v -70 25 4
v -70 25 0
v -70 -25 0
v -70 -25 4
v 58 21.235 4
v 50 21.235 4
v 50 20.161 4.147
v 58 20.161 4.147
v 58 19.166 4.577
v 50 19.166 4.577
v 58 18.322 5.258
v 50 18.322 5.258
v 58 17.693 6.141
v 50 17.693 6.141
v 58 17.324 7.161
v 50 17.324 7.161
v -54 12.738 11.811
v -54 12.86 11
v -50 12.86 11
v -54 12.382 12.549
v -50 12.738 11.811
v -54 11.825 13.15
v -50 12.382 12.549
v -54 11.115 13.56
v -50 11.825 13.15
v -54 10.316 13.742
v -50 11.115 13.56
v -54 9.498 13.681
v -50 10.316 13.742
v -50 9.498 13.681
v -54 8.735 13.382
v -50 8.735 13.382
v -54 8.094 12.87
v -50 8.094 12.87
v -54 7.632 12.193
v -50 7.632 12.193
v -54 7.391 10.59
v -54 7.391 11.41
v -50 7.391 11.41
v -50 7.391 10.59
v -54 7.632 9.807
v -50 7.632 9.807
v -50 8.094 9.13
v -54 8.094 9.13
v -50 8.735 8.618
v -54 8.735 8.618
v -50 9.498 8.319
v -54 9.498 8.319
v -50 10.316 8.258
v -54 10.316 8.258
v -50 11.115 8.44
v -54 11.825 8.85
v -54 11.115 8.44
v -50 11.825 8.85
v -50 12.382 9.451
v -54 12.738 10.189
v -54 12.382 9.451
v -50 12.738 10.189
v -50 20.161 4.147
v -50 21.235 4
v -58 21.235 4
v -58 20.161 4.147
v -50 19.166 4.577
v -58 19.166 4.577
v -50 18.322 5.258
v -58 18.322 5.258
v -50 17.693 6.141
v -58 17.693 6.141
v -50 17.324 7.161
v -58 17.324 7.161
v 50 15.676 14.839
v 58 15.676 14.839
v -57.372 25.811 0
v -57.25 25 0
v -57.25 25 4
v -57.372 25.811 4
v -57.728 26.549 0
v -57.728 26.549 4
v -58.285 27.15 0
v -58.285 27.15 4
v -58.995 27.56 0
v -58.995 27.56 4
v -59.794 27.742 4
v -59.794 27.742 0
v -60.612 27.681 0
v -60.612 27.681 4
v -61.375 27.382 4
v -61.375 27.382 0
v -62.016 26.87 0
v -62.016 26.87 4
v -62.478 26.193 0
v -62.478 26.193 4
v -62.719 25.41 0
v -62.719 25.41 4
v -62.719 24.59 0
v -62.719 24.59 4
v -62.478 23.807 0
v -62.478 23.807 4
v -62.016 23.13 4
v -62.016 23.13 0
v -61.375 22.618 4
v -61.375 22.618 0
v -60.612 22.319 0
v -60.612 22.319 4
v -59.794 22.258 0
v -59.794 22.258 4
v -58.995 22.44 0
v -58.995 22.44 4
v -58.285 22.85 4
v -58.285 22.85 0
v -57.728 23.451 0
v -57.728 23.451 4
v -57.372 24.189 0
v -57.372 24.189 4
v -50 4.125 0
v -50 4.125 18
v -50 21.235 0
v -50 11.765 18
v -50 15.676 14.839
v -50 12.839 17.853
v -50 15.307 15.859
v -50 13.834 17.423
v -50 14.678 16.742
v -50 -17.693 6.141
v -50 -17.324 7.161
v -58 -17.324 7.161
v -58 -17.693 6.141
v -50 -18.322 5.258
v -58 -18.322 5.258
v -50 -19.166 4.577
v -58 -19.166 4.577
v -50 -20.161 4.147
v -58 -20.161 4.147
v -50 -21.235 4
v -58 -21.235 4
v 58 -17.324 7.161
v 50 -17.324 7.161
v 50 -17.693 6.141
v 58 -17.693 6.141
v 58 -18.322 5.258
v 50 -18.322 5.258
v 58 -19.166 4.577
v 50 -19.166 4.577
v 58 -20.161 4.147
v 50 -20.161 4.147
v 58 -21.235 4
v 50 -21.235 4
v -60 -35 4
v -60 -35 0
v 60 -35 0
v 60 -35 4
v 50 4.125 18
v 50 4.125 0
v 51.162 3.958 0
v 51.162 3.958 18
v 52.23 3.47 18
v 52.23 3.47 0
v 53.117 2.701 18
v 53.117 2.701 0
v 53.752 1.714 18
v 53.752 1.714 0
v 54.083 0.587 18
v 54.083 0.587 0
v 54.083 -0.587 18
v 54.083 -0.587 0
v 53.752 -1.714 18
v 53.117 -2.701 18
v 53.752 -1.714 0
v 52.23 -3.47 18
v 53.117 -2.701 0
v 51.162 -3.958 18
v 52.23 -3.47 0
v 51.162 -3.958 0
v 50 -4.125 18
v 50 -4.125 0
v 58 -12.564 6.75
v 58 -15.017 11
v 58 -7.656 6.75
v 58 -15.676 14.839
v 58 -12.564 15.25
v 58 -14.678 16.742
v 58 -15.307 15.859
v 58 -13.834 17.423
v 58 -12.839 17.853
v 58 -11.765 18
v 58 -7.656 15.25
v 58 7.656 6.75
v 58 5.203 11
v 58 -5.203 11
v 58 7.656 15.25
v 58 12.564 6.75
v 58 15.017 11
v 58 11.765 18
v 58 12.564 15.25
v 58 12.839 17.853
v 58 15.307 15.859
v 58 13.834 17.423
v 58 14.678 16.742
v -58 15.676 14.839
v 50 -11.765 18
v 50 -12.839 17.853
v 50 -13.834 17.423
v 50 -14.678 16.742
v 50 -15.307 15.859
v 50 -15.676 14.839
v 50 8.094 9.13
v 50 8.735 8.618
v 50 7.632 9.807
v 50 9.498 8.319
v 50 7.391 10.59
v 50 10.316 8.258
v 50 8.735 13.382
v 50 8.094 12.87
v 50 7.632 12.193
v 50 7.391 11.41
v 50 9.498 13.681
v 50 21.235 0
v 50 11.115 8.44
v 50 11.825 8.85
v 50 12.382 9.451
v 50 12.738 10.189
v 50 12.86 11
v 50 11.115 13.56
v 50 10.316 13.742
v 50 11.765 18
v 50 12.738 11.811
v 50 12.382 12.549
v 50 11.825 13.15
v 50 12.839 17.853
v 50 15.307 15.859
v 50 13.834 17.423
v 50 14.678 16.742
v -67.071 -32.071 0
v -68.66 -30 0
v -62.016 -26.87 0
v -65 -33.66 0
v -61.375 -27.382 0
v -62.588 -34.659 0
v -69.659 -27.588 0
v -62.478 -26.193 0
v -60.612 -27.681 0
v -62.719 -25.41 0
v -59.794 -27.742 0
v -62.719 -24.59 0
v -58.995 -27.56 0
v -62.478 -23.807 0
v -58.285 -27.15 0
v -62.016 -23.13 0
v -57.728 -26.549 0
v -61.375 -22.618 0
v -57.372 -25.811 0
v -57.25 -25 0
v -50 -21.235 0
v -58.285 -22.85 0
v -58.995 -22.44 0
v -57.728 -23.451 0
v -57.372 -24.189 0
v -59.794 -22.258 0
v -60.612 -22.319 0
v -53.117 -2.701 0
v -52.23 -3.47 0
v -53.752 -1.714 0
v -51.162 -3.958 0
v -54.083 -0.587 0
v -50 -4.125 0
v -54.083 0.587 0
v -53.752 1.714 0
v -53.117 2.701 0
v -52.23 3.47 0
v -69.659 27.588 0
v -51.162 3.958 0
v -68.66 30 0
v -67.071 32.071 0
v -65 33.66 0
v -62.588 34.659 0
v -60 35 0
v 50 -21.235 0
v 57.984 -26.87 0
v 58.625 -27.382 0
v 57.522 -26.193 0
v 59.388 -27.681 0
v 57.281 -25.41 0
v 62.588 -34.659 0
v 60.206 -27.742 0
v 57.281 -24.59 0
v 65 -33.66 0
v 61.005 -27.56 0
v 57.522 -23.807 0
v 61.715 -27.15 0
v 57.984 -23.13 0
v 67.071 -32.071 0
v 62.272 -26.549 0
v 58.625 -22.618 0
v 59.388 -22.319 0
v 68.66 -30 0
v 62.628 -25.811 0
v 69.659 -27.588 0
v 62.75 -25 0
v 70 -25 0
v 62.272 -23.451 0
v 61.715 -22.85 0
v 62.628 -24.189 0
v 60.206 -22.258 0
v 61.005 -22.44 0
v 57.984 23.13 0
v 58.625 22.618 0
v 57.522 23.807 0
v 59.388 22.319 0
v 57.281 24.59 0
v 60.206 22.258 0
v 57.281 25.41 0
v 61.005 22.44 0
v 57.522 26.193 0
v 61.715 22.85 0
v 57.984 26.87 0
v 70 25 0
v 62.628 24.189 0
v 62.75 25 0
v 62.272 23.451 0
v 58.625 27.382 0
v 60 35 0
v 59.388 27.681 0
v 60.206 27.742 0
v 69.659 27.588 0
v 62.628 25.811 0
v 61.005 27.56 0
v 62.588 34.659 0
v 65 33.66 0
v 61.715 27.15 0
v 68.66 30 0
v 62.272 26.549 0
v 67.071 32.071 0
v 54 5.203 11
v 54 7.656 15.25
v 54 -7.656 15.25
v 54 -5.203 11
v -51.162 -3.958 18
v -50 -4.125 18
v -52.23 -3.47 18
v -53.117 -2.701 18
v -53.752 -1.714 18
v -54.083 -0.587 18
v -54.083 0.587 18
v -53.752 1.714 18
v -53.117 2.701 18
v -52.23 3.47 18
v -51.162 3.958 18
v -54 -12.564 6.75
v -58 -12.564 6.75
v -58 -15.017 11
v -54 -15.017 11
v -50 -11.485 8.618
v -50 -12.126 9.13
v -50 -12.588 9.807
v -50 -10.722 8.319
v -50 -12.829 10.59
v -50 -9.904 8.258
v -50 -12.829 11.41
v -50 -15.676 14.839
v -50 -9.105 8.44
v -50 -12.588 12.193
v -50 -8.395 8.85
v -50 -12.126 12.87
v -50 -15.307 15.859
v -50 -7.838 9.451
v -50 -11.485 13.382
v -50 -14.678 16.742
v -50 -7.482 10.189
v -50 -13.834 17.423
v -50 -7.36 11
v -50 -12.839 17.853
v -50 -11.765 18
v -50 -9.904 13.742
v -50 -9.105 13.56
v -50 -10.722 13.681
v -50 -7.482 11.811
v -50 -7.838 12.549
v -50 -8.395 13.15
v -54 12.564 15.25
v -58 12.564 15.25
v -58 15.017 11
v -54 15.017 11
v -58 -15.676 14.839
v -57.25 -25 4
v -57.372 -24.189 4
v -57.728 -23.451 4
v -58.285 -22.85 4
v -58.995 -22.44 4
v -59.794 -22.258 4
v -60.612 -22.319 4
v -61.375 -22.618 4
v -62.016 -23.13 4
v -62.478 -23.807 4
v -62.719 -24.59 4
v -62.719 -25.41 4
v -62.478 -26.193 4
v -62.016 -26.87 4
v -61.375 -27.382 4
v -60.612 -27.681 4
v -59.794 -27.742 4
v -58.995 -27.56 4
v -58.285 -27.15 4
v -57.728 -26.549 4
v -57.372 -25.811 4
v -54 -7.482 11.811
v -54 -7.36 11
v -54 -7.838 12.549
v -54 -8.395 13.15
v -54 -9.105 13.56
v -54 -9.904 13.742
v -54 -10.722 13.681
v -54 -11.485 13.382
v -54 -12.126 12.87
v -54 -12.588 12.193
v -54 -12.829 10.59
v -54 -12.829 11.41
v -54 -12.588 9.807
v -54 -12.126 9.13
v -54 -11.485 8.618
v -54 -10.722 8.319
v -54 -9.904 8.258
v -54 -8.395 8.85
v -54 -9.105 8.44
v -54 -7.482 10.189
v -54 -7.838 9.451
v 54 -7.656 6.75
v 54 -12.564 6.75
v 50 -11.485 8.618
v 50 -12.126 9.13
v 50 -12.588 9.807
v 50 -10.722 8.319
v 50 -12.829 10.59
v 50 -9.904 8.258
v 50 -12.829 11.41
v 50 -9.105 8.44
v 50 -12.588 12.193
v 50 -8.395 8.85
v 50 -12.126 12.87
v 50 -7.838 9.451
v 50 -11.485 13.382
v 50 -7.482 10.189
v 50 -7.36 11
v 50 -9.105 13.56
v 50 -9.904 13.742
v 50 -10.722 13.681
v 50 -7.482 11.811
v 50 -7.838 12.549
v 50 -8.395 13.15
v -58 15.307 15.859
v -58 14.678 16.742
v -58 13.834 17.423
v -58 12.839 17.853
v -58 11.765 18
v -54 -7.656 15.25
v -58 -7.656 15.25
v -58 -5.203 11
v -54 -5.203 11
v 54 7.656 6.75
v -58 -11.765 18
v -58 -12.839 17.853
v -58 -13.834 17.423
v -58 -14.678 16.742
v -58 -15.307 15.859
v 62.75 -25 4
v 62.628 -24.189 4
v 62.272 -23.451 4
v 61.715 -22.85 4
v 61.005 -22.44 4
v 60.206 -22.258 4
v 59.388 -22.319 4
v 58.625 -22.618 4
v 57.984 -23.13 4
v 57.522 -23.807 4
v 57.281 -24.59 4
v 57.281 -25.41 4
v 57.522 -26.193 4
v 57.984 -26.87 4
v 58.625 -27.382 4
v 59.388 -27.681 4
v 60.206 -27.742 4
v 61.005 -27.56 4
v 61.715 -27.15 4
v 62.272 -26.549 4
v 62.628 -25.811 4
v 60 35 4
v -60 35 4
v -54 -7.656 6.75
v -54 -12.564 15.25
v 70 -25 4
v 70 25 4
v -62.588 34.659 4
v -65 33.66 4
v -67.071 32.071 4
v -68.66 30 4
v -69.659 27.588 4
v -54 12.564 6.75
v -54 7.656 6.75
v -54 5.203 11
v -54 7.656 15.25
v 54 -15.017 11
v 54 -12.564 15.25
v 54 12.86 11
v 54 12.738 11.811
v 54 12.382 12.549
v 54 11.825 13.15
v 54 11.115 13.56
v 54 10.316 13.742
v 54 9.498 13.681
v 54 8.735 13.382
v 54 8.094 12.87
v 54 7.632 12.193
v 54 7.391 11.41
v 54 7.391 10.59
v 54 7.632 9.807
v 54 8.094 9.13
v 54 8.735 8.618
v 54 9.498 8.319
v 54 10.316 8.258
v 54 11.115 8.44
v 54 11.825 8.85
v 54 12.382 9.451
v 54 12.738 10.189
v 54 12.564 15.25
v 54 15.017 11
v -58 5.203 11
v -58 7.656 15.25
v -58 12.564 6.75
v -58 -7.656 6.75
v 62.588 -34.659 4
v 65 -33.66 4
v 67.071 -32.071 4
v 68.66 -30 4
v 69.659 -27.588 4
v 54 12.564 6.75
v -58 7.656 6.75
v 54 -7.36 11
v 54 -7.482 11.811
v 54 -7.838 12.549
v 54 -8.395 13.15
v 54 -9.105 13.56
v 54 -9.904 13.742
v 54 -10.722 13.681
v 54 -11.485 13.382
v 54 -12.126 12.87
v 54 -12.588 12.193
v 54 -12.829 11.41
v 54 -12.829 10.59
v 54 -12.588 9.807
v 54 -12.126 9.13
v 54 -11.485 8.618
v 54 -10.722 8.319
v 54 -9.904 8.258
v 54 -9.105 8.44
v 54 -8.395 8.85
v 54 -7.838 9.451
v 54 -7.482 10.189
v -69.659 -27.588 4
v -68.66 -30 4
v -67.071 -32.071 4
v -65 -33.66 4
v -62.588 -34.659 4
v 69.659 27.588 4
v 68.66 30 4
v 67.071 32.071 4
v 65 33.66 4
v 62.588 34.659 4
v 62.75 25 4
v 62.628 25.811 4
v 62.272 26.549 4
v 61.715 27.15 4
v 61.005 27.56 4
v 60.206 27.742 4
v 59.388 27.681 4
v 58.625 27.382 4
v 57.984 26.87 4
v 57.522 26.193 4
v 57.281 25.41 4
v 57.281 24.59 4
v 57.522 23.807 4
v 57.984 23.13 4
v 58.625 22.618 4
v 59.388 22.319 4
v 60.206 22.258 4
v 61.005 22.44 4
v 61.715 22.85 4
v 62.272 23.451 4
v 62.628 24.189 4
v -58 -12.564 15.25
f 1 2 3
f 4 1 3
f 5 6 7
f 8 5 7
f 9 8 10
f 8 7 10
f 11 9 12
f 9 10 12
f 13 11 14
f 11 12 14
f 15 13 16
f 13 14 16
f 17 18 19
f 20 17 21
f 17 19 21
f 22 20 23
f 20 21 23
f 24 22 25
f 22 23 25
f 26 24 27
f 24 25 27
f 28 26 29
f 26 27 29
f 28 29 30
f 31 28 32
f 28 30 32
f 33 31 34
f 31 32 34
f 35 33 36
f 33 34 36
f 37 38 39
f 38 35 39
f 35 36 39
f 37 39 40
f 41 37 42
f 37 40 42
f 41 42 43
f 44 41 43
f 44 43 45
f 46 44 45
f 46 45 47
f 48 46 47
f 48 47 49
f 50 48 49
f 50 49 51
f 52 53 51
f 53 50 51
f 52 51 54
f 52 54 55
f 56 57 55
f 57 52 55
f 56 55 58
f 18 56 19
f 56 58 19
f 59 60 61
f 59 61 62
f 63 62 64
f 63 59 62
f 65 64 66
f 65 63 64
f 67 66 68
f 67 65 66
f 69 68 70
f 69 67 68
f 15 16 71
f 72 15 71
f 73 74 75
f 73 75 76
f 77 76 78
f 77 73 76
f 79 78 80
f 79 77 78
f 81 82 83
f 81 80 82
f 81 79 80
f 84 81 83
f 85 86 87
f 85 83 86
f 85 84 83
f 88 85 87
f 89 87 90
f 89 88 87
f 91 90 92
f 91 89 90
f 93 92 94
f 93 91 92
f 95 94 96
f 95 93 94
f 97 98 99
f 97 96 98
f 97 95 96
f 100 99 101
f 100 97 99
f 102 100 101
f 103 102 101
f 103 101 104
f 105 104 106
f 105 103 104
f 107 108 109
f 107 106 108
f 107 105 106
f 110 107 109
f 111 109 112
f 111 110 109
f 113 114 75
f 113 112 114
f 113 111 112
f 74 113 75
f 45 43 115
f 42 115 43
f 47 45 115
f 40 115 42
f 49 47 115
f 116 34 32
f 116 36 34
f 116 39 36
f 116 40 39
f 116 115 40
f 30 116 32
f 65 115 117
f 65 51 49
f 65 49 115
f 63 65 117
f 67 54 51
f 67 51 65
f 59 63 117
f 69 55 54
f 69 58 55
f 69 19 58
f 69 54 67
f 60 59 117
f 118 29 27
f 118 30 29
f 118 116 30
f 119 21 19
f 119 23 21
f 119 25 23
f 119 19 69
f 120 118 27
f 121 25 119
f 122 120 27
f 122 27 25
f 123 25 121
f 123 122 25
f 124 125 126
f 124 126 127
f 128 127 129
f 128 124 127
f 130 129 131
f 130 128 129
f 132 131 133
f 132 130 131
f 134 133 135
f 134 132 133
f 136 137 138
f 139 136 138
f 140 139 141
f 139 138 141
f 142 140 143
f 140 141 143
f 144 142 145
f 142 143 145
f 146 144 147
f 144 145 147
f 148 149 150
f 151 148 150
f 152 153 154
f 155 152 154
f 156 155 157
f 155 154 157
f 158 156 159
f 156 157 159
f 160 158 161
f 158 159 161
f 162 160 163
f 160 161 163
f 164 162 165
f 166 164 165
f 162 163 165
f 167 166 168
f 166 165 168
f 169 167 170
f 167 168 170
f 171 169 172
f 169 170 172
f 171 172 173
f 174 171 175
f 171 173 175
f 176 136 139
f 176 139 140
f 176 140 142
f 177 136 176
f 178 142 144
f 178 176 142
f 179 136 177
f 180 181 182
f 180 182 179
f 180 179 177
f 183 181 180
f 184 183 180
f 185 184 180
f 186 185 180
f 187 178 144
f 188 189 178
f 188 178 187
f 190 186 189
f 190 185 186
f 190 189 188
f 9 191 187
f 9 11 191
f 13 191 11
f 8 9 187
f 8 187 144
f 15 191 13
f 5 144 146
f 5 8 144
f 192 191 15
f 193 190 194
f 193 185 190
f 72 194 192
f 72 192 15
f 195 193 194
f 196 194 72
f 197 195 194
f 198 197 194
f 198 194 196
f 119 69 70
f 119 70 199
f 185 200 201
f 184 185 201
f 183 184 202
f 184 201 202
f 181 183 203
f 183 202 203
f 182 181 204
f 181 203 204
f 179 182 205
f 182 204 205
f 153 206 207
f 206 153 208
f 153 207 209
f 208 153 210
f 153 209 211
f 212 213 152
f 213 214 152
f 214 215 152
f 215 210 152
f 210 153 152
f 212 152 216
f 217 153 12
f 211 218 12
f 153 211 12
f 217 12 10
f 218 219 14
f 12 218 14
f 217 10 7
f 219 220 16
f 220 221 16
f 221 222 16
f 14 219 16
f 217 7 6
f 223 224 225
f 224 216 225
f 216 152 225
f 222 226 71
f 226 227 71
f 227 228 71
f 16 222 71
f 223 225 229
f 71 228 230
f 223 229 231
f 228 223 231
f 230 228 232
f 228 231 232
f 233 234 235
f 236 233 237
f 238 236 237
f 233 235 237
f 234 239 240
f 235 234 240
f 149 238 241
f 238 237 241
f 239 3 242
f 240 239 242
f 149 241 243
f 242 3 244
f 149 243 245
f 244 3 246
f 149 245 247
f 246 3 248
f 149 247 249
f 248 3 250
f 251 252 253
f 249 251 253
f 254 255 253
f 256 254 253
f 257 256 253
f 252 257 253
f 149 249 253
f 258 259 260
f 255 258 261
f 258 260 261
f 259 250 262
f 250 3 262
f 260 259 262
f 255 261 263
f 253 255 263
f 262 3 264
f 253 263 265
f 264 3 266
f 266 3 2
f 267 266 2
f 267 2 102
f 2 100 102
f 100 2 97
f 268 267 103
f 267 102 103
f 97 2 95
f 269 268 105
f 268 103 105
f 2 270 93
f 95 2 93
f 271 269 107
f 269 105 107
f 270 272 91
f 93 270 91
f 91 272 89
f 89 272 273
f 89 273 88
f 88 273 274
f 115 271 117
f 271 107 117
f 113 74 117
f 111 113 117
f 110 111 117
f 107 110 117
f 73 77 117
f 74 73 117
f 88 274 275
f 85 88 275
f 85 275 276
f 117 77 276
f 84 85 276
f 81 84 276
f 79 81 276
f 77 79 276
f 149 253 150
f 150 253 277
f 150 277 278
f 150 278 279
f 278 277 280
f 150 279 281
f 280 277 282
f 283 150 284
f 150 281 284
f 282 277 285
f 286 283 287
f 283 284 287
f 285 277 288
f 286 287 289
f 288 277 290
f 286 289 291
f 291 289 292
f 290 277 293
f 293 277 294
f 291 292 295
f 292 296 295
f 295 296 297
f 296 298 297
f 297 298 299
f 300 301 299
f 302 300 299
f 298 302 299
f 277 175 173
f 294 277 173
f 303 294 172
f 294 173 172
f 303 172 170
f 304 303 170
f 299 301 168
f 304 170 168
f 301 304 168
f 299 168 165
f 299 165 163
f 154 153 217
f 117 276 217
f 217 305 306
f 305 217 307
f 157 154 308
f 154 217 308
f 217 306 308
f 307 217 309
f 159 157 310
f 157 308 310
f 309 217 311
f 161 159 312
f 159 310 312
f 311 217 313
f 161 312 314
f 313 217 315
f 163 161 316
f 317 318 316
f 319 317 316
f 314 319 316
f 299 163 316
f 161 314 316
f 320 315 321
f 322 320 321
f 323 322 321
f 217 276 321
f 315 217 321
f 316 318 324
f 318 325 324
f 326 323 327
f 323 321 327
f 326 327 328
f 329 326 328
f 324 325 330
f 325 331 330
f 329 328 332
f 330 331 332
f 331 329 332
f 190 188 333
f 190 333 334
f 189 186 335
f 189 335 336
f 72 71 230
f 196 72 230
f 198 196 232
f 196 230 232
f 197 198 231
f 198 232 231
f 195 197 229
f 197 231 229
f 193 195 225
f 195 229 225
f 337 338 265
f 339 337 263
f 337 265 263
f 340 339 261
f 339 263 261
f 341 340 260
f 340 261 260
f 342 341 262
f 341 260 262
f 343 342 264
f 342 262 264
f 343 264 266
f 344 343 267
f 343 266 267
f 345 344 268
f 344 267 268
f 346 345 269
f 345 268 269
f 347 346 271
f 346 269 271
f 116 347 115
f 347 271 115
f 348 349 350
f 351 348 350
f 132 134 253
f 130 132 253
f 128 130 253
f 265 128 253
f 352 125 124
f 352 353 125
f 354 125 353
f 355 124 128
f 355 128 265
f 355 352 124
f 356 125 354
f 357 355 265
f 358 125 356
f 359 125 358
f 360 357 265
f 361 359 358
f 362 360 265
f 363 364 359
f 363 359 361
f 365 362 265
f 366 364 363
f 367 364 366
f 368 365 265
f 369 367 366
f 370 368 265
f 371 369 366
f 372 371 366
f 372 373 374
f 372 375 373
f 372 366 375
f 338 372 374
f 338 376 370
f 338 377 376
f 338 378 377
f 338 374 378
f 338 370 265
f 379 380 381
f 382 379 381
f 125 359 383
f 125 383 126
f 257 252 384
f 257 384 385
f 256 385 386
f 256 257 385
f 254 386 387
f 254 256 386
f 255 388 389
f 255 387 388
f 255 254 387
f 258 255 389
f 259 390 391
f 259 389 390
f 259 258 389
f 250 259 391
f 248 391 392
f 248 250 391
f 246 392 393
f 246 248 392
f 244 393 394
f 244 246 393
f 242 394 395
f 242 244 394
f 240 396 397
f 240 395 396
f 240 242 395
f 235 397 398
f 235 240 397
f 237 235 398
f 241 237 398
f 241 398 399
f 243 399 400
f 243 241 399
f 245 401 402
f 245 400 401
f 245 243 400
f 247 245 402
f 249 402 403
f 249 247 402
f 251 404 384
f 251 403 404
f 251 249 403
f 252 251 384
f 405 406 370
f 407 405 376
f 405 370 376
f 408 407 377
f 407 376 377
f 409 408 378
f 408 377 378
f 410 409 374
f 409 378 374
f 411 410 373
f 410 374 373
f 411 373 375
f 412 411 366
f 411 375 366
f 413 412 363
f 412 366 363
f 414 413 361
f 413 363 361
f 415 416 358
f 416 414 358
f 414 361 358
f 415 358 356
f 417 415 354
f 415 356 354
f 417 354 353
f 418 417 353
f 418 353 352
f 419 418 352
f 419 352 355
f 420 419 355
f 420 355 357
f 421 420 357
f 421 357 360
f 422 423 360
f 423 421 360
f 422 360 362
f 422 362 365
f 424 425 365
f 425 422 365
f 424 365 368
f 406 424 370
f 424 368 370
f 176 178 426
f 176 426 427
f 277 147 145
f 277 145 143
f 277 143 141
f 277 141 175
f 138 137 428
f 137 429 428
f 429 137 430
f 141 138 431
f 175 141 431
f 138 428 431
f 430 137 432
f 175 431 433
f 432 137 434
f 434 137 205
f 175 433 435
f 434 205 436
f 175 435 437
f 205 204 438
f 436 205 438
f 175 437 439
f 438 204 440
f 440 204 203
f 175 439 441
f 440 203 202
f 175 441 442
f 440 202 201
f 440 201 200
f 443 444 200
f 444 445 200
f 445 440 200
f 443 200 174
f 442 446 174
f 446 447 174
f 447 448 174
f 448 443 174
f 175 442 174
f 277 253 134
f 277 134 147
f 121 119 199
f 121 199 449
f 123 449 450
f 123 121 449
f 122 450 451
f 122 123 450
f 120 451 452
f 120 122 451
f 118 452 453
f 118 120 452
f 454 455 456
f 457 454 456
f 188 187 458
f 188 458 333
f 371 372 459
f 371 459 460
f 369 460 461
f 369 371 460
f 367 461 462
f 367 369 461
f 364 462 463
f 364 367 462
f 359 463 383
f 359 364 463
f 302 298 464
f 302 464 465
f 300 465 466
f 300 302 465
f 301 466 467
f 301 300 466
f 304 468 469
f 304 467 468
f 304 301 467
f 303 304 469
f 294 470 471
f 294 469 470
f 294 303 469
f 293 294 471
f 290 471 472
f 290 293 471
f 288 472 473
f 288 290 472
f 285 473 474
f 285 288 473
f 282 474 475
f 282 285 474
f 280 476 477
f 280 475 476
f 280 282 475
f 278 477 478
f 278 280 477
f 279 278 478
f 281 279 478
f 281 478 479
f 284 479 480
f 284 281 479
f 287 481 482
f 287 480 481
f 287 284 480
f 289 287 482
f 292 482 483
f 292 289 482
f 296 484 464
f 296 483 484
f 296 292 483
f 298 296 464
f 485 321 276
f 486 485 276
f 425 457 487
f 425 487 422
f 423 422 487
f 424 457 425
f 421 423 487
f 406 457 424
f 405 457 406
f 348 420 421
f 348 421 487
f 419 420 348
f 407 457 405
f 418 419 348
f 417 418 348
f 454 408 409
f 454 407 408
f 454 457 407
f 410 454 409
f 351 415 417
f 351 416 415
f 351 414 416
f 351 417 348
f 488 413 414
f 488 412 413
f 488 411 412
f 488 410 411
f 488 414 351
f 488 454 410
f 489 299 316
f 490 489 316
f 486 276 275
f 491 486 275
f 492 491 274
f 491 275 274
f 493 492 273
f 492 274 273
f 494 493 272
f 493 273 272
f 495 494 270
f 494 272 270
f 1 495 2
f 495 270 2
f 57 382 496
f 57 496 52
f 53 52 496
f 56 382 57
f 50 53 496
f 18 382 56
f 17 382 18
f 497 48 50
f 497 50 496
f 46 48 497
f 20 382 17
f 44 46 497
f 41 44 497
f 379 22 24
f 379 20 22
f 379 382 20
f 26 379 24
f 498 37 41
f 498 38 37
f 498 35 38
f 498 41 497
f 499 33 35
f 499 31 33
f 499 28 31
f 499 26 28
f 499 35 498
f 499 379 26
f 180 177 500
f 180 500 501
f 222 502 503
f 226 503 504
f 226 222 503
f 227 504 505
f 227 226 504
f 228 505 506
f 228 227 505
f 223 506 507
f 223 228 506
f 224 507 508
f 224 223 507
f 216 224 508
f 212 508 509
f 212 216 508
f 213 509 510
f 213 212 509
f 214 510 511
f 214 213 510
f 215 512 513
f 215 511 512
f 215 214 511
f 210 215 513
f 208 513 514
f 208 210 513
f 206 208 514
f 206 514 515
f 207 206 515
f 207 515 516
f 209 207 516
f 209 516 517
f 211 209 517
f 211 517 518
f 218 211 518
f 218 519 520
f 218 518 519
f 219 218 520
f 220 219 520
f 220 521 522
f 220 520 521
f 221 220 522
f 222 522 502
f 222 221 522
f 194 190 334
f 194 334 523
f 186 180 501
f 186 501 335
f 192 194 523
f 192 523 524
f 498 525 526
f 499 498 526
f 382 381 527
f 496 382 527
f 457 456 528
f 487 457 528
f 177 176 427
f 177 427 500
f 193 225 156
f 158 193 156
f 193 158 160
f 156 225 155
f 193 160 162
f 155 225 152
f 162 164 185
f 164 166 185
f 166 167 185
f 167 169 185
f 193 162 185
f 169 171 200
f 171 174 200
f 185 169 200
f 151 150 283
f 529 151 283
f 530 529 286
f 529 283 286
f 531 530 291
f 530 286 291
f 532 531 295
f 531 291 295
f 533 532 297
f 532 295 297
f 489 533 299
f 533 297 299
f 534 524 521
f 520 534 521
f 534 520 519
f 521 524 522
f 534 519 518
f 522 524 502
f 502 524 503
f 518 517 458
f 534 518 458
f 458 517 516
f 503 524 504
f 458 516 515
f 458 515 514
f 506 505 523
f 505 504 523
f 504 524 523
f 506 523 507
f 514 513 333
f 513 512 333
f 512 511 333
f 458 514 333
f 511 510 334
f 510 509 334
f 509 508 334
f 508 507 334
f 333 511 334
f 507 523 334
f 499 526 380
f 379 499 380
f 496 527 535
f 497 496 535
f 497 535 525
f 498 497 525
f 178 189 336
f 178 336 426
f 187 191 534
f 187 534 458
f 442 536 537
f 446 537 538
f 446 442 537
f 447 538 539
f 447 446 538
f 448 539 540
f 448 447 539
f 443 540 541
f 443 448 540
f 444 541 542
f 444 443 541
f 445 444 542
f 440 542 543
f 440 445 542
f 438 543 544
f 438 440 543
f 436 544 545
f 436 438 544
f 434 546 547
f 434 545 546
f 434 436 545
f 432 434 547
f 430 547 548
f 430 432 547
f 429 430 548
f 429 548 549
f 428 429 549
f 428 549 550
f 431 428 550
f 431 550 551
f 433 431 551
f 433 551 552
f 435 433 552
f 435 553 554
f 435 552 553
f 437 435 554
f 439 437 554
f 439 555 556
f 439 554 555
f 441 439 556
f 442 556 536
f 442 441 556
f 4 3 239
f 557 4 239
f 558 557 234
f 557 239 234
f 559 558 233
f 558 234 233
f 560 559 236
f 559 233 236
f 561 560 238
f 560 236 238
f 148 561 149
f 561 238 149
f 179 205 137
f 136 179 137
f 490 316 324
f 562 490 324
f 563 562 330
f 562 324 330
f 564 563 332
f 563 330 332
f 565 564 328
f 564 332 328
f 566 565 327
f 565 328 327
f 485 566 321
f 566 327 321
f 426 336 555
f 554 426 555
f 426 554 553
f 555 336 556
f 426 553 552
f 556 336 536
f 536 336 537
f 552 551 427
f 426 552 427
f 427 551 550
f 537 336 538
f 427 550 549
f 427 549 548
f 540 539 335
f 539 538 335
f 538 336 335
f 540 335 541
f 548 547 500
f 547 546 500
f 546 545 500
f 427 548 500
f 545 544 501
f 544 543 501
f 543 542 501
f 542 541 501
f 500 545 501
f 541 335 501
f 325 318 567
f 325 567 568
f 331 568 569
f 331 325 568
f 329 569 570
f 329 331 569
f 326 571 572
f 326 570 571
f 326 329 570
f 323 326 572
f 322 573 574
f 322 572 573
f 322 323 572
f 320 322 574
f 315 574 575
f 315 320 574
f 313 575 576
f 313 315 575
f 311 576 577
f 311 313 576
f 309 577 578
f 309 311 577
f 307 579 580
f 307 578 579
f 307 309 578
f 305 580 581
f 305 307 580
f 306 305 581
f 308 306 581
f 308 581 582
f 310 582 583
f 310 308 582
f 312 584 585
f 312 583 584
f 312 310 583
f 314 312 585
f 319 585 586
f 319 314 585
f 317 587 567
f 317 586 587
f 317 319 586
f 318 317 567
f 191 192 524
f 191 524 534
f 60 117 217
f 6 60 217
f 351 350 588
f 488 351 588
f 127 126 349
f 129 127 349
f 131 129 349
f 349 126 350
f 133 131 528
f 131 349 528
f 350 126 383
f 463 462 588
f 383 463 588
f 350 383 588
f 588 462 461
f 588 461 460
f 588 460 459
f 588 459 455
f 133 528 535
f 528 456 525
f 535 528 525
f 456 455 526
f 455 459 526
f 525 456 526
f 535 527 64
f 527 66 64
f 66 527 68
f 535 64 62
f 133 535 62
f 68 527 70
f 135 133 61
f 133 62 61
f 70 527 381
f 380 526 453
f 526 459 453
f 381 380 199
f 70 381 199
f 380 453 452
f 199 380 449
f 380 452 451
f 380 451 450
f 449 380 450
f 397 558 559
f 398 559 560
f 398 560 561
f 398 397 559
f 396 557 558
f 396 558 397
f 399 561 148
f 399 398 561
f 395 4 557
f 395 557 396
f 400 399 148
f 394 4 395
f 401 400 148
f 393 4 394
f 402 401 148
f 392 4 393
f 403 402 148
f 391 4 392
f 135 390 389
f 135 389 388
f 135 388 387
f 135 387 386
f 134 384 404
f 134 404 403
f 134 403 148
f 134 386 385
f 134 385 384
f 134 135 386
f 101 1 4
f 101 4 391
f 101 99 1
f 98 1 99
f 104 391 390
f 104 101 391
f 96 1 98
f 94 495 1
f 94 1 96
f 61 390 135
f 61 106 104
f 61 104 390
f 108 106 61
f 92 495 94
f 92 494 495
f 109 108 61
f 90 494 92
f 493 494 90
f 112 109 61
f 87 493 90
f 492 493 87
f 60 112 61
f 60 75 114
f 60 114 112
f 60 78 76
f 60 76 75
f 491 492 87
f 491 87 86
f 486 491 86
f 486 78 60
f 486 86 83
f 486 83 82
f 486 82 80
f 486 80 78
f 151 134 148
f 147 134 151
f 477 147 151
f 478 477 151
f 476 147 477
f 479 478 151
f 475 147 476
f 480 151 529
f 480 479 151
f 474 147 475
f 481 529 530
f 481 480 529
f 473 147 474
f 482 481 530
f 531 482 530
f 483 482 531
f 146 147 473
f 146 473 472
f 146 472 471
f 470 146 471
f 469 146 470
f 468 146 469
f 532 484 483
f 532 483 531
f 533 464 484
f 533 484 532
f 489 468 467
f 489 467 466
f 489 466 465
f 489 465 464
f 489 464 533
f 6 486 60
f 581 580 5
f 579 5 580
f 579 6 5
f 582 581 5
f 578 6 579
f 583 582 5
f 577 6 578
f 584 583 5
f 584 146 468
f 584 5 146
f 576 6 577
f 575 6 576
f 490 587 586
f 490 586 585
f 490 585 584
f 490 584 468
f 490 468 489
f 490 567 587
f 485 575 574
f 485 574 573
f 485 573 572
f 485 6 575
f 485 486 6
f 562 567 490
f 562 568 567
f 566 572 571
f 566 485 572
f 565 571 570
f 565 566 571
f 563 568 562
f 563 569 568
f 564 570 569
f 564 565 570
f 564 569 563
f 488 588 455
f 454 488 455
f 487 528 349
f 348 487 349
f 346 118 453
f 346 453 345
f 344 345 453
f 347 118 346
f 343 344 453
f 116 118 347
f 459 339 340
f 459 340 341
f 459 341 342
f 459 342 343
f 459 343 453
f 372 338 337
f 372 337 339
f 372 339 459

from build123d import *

# Parameters (mm, degrees)
F0_R     = 2.75
F0_W     = 100
F0_H     = 42.47
F1_DEPTH = 4
F2_R     = 2.75
F3_DEPTH = 8
F4_R     = 2.75
F5_DEPTH = 4
F7_R     = 4.125
F8_DEPTH = 18.001


with BuildPart() as f1:
    # F0 (on Top) → F1 (new body)
    with BuildSketch(Plane.XY):
        with BuildLine():
            ThreePointArc((70, 25), (67.0710678119, 32.0710678119), (60, 35))
            Line((60, 35), (-60, 35))
            ThreePointArc((-60, 35), (-67.0710678119, 32.0710678119), (-70, 25))
            Line((-70, 25), (-70, -25))
            ThreePointArc((-70, -25), (-67.0710678119, -32.0710678119), (-60, -35))
            Line((-60, -35), (60, -35))
            ThreePointArc((60, -35), (67.0710678119, -32.0710678119), (70, -25))
            Line((70, -25), (70, 25))
        make_face()
        with Locations((-60, -25)):
            Circle(F0_R, mode=Mode.SUBTRACT)
        with Locations((60, -25)):
            Circle(F0_R, mode=Mode.SUBTRACT)
        with Locations((-60, 25)):
            Circle(F0_R, mode=Mode.SUBTRACT)
        Rectangle(F0_W, F0_H, mode=Mode.SUBTRACT)
        with Locations((60, 25)):
            Circle(F0_R, mode=Mode.SUBTRACT)
    extrude(amount=F1_DEPTH)

    # F2 (on face) → F3 (join)
    with BuildSketch(Plane.YZ.offset(-50)):
        with BuildLine():
            ThreePointArc((-17.3240695981, 7.1605815157), (-18.7208076781, 4.8889170746), (-21.235, 4))
            Line((-21.235, 4), (21.235, 4))
            ThreePointArc((21.235, 4), (18.7208076781, 4.8889170746), (17.3240695981, 7.1605815157))
            Line((17.3240695981, 7.1605815157), (15.6759304019, 14.8394184843))
            ThreePointArc((15.6759304019, 14.8394184843), (14.2791923219, 17.1110829254), (11.765, 18))
            Line((11.765, 18), (-11.765, 18))
            ThreePointArc((-11.765, 18), (-14.2791923219, 17.1110829254), (-15.6759304019, 14.8394184843))
            Line((-15.6759304019, 14.8394184843), (-17.3240695981, 7.1605815157))
        make_face()
        with Locations((-10.11, 11)):
            Circle(F2_R, mode=Mode.SUBTRACT)
        with Locations((10.11, 11)):
            Circle(F2_R, mode=Mode.SUBTRACT)
    extrude(amount=-F3_DEPTH)

    # F4 (on face) → F5 (cut)
    with BuildSketch(Plane(origin=(-58, 0, 0), x_dir=(0, -1, 0), z_dir=(-1, 0, 0))):
        Polygon((-5.2025227119, 11), (-7.6562613559, 15.25), (-12.5637386441, 15.25), (-15.0174772881, 11), (-12.5637386441, 6.75), (-7.6562613559, 6.75), align=None)
        with Locations((-10.11, 11)):
            Circle(F4_R, mode=Mode.SUBTRACT)
        Polygon((7.6562613559, 6.75), (12.5637386441, 6.75), (15.0174772881, 11), (12.5637386441, 15.25), (7.6562613559, 15.25), (5.2025227119, 11), align=None)
        with Locations((10.11, 11)):
            Circle(F4_R, mode=Mode.SUBTRACT)
    extrude(amount=-F5_DEPTH, mode=Mode.SUBTRACT)

    # F6: F1 across plane


with BuildPart() as f1_1:
    add(f1.part)
    add(f1.part.mirror(Plane.YZ))

    # F7 (on face) → F8 (cut, through all)
    with BuildSketch(Plane(origin=(0, 0, 0), x_dir=(1, 0, 0), z_dir=(0, 0, -1))):
        with Locations((-50, 0)):
            Circle(F7_R)
        with Locations((50, 0)):
            Circle(F7_R)
    extrude(amount=-F8_DEPTH, mode=Mode.SUBTRACT)


solid = f1_1.part
